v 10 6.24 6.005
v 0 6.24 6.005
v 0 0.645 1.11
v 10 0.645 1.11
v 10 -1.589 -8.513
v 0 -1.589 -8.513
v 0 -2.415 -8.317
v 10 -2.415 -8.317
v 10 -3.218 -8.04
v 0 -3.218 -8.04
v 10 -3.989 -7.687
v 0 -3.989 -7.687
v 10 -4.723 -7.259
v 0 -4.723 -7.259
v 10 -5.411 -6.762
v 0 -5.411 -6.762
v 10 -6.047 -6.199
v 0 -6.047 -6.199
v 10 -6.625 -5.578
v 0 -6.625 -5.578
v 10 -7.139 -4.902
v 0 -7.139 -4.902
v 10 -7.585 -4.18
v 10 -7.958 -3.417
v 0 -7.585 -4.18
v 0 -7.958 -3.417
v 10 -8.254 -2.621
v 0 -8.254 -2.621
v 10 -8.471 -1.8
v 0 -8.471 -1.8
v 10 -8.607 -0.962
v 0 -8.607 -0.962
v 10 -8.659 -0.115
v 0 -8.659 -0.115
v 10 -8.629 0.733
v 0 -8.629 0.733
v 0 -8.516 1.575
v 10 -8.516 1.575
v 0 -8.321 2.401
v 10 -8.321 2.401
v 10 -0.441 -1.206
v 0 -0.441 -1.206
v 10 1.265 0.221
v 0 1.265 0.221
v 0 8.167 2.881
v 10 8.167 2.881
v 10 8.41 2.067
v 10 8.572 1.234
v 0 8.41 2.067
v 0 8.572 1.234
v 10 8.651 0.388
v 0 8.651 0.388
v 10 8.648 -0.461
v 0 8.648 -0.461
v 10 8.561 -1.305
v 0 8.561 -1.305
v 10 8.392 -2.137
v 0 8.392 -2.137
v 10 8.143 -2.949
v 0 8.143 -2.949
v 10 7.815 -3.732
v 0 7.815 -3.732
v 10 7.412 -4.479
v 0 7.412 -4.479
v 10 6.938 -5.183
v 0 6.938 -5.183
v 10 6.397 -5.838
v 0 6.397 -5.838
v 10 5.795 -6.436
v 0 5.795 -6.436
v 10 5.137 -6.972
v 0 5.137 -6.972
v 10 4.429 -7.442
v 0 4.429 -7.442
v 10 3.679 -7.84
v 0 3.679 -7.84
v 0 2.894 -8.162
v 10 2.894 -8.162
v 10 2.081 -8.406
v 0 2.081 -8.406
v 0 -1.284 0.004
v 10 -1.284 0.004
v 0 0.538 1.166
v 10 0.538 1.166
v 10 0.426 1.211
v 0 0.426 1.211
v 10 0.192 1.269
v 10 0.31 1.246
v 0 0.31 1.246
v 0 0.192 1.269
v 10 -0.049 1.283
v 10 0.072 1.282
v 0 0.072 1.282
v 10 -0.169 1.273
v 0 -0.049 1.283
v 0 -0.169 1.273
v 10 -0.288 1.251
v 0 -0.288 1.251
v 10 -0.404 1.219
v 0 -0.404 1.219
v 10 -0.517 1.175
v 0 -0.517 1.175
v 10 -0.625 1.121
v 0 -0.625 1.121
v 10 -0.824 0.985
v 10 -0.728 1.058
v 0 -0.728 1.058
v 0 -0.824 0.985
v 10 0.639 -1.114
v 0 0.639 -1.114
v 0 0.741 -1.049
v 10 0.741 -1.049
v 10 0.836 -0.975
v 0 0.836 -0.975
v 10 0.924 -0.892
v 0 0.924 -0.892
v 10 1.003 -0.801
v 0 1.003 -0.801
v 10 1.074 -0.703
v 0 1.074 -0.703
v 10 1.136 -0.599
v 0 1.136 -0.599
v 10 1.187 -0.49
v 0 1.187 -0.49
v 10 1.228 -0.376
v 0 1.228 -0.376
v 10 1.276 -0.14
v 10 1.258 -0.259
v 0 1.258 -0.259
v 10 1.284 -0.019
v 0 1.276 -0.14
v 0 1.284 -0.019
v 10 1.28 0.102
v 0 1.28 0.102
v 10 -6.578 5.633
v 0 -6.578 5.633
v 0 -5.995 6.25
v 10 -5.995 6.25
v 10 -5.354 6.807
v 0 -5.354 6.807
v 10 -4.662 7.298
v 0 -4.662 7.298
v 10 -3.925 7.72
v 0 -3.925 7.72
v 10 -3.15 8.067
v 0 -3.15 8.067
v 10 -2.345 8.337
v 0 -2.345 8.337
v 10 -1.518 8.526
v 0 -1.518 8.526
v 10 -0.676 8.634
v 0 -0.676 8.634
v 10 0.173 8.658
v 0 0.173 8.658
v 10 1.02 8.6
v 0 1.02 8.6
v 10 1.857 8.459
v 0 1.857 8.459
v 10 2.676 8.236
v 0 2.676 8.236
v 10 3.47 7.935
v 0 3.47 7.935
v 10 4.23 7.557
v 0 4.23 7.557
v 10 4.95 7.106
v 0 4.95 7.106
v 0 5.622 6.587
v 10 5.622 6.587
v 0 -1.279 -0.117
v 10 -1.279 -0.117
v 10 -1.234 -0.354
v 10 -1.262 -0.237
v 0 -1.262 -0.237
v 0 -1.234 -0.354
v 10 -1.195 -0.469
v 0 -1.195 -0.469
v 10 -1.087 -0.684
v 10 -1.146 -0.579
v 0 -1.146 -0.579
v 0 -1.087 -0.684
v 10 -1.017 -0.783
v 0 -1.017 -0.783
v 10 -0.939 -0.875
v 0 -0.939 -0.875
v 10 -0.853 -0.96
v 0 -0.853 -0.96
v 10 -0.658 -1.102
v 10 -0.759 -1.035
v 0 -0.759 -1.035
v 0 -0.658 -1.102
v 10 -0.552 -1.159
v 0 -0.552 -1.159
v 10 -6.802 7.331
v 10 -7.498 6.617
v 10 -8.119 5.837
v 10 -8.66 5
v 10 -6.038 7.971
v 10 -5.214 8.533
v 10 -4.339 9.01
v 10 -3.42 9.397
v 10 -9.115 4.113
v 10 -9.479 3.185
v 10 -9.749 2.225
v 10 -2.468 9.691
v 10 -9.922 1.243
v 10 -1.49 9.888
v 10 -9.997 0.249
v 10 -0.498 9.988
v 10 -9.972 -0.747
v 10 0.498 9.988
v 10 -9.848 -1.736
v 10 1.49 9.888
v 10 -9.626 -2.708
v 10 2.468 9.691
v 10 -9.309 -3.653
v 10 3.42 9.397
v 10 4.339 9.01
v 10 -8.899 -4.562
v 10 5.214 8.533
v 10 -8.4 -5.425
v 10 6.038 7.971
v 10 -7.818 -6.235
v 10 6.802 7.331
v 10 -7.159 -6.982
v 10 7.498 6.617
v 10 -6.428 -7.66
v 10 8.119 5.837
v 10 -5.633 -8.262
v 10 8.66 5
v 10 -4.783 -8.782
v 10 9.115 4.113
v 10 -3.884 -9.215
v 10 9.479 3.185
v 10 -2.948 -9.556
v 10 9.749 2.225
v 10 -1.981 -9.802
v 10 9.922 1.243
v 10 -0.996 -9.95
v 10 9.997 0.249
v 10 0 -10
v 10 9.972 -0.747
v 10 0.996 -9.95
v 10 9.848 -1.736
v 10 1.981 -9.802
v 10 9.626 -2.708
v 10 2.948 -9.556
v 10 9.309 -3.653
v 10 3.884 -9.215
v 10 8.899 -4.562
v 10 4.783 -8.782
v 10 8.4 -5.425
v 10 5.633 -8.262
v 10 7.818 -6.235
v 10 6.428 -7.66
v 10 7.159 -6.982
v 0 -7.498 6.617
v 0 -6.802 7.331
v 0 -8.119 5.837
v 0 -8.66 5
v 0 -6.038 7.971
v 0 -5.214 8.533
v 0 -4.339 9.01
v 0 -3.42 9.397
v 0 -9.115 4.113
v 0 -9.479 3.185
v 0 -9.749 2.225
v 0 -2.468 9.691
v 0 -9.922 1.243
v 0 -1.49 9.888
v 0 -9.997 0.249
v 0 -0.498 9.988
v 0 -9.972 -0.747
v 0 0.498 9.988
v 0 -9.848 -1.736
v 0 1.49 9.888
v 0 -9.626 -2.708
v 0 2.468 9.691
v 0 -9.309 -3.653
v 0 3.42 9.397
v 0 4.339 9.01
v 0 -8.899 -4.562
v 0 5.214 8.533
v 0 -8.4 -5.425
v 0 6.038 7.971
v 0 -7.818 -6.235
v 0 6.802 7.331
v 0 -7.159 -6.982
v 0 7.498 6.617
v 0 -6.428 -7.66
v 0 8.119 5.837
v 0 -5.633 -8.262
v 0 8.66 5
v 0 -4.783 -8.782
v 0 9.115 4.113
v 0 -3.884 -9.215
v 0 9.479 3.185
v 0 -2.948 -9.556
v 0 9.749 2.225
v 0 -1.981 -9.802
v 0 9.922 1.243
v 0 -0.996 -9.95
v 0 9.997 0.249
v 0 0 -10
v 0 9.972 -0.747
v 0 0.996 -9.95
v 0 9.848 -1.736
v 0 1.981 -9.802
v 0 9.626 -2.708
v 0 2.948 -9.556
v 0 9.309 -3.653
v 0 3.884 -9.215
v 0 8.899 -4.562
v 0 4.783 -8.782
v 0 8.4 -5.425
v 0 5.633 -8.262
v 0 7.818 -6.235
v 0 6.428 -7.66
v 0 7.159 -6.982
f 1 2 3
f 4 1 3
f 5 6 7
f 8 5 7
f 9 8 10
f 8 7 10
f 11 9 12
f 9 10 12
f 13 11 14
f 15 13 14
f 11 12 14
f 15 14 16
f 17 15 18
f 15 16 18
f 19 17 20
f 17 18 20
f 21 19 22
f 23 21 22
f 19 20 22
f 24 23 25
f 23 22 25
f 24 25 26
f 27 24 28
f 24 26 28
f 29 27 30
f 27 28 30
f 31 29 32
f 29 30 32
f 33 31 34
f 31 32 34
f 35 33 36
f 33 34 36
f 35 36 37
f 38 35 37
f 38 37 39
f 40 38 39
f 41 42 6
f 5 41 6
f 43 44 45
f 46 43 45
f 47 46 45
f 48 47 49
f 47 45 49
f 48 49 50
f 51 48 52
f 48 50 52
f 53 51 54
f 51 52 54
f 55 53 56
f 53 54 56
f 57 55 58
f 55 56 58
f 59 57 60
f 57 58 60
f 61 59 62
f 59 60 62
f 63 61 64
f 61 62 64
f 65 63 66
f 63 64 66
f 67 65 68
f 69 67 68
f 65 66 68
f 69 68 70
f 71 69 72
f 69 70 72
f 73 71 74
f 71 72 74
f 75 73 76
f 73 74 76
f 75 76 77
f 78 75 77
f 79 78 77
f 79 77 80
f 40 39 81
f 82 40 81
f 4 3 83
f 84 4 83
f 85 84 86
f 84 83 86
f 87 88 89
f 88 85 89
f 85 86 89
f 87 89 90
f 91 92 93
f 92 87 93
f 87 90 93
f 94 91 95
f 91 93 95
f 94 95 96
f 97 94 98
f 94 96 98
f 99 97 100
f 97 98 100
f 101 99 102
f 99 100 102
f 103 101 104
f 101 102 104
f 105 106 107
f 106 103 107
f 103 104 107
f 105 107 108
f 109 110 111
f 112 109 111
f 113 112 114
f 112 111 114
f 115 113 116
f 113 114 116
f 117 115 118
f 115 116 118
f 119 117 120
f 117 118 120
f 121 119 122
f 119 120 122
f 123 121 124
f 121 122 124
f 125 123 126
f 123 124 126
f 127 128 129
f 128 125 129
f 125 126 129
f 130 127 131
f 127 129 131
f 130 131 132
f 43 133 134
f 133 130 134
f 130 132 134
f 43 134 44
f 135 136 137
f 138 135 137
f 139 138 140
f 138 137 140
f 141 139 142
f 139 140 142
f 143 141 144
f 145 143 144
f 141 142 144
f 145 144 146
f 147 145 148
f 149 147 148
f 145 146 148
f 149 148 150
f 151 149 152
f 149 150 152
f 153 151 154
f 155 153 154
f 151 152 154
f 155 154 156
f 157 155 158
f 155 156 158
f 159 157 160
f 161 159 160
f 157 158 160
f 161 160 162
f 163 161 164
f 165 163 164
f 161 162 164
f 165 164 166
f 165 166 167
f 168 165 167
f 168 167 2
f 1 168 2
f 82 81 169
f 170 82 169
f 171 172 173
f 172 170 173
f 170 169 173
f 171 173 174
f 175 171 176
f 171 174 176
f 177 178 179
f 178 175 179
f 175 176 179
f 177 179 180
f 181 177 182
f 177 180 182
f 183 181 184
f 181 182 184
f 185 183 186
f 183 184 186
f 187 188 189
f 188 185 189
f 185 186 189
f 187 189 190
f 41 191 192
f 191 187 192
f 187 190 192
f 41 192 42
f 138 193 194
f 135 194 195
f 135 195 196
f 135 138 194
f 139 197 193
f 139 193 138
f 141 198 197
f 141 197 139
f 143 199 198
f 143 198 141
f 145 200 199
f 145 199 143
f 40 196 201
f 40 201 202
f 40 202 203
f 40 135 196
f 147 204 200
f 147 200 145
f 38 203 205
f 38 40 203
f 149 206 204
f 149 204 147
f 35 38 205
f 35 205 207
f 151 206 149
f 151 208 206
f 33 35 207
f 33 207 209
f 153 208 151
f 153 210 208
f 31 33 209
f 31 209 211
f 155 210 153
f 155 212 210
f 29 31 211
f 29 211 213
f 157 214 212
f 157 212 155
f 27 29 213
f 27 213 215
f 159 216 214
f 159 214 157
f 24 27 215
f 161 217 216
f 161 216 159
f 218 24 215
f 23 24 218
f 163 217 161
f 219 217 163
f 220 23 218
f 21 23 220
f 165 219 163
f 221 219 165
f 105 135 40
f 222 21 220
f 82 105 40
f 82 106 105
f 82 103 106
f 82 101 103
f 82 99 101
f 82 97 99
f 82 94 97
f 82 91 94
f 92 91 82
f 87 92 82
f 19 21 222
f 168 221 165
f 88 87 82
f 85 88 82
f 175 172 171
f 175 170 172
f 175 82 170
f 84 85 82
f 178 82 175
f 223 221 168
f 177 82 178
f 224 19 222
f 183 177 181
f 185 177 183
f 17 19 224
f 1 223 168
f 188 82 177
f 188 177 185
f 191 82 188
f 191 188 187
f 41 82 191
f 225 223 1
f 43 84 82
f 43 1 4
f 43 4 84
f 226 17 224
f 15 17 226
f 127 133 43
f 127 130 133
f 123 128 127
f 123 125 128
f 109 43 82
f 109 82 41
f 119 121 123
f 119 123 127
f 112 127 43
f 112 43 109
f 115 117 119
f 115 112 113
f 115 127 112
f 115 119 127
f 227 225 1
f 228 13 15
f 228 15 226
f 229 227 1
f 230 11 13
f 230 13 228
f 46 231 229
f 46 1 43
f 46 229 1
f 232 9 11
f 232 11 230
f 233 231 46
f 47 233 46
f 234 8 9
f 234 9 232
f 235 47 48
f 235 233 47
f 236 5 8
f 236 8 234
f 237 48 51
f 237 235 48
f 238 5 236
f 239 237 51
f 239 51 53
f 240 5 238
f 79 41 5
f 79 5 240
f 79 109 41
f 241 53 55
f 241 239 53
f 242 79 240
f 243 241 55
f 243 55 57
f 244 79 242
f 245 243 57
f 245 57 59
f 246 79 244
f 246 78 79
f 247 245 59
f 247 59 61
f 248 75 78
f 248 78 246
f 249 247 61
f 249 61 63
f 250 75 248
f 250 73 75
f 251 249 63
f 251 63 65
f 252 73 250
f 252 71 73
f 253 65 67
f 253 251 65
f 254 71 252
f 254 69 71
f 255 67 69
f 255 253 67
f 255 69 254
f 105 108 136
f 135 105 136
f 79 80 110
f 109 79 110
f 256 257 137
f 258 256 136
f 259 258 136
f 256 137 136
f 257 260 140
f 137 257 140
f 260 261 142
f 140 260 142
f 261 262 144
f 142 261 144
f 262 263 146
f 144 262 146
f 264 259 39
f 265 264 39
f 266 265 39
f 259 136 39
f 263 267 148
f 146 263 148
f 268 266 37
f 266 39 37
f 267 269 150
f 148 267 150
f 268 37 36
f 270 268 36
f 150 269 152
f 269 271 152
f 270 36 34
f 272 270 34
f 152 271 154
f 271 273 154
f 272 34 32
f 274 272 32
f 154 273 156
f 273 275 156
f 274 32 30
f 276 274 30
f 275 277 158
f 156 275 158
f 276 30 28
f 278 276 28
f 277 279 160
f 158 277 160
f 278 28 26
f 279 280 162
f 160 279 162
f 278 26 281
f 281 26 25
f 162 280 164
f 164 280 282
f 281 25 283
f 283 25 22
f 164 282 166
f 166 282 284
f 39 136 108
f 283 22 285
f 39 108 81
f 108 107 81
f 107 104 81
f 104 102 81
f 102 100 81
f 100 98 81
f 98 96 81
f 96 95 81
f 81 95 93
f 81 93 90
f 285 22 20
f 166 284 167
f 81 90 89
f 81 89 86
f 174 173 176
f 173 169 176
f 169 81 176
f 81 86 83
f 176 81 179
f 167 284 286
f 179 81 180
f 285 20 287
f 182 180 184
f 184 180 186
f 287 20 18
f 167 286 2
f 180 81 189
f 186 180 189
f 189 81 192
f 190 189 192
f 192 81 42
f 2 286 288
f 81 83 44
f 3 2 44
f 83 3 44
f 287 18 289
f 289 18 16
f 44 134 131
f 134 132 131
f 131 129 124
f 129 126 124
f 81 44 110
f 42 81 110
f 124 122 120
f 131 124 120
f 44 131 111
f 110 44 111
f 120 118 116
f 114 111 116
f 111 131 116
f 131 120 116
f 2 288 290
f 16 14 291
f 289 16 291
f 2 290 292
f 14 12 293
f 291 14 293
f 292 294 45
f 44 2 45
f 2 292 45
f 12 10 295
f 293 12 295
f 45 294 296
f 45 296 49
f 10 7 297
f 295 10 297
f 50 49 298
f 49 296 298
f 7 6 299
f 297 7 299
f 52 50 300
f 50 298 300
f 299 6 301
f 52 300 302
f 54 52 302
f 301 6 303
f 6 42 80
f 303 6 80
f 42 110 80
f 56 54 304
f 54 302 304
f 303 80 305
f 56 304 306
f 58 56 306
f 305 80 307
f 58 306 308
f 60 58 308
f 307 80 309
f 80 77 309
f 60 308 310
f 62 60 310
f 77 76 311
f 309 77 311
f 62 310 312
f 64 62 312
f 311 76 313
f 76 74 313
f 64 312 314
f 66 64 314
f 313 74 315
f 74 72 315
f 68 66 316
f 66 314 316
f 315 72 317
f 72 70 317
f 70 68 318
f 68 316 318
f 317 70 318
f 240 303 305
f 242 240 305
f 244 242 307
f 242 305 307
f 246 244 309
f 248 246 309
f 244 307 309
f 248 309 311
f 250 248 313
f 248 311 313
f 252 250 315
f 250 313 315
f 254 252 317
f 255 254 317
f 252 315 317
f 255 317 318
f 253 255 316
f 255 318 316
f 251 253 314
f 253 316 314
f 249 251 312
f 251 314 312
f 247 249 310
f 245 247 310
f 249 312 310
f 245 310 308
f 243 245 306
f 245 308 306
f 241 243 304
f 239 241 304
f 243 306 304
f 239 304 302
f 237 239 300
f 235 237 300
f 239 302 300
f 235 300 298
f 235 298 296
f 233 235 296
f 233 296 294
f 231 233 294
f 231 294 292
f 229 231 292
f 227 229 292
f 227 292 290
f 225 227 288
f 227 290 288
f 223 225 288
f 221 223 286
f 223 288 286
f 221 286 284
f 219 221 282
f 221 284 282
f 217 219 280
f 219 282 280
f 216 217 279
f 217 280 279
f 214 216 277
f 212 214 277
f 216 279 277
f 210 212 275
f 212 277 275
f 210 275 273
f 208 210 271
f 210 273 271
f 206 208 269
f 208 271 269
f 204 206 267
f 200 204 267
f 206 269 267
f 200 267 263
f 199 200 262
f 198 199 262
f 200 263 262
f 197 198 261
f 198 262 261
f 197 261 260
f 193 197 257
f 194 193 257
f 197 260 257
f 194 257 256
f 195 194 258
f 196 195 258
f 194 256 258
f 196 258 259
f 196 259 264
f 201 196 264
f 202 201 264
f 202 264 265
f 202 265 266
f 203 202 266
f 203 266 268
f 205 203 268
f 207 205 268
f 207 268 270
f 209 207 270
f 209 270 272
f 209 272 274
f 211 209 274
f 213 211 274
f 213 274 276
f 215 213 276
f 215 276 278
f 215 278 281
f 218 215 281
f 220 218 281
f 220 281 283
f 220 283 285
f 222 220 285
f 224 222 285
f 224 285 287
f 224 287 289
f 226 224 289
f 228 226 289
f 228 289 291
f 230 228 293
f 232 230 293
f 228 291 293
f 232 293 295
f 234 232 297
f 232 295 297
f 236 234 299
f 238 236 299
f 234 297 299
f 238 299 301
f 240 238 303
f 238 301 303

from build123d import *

# Parameters (mm, degrees)
SKETCH1_R               = 10
BOSS_EXTRUDE1_DEPTH     = 10
CUT_EXTRUDE1_DEPTH      = 18.320508076
CUT_EXTRUDE1_DEPTH_BACK = 18.320508076


with BuildPart() as part:
    # Sketch1 → Boss-Extrude1 (new body)
    with BuildSketch(Plane(origin=(0, 0, 0), x_dir=(0, 0, -1), z_dir=(1, 0, 0))):
        Circle(SKETCH1_R)
    extrude(amount=BOSS_EXTRUDE1_DEPTH)

    # Sketch2 → Cut-Extrude1 (cut, two sides: drawn at the far end of the back side and taken through both)
    with BuildSketch(Plane(origin=(10, 0, 0), x_dir=(0, 0, -1), z_dir=(1, 0, 0)).offset(-CUT_EXTRUDE1_DEPTH_BACK)):
        with BuildLine():
            Line((-6.005338319, 6.239789308), (-1.110102081, 0.645057171))
            ThreePointArc((-1.110102081, 0.645057171), (-1.279247043, -0.109326976), (-0.98454757, -0.824070062))
            Line((-0.98454757, -0.824070062), (-5.632597517, -6.578214359))
            ThreePointArc((-5.632597517, -6.578214359), (-8.656540425, -0.251727641), (-6.005338319, 6.239789308))
        make_face()
        with BuildLine():
            Line((8.406485214, 2.080880889), (1.113686937, 0.638848017))
            ThreePointArc((1.113686937, 0.638848017), (0.544943583, 1.162523924), (-0.221391823, 1.264678237))
            Line((-0.221391823, 1.264678237), (-2.880601988, 8.167079718))
            ThreePointArc((-2.880601988, 8.167079718), (4.110267681, 7.622647737), (8.406485214, 2.080880889))
        make_face()
        with BuildLine():
            Line((-2.401146895, -8.320670197), (-0.003584856, -1.283905188))
            ThreePointArc((-0.003584856, -1.283905188), (0.73430346, -1.053196949), (1.205939393, -0.440608176))
            Line((1.205939393, -0.440608176), (8.513199505, -1.588865359))
            ThreePointArc((8.513199505, -1.588865359), (4.546272744, -7.370920096), (-2.401146895, -8.320670197))
        make_face()
    extrude(amount=CUT_EXTRUDE1_DEPTH + CUT_EXTRUDE1_DEPTH_BACK, mode=Mode.SUBTRACT)


solid = part.part
